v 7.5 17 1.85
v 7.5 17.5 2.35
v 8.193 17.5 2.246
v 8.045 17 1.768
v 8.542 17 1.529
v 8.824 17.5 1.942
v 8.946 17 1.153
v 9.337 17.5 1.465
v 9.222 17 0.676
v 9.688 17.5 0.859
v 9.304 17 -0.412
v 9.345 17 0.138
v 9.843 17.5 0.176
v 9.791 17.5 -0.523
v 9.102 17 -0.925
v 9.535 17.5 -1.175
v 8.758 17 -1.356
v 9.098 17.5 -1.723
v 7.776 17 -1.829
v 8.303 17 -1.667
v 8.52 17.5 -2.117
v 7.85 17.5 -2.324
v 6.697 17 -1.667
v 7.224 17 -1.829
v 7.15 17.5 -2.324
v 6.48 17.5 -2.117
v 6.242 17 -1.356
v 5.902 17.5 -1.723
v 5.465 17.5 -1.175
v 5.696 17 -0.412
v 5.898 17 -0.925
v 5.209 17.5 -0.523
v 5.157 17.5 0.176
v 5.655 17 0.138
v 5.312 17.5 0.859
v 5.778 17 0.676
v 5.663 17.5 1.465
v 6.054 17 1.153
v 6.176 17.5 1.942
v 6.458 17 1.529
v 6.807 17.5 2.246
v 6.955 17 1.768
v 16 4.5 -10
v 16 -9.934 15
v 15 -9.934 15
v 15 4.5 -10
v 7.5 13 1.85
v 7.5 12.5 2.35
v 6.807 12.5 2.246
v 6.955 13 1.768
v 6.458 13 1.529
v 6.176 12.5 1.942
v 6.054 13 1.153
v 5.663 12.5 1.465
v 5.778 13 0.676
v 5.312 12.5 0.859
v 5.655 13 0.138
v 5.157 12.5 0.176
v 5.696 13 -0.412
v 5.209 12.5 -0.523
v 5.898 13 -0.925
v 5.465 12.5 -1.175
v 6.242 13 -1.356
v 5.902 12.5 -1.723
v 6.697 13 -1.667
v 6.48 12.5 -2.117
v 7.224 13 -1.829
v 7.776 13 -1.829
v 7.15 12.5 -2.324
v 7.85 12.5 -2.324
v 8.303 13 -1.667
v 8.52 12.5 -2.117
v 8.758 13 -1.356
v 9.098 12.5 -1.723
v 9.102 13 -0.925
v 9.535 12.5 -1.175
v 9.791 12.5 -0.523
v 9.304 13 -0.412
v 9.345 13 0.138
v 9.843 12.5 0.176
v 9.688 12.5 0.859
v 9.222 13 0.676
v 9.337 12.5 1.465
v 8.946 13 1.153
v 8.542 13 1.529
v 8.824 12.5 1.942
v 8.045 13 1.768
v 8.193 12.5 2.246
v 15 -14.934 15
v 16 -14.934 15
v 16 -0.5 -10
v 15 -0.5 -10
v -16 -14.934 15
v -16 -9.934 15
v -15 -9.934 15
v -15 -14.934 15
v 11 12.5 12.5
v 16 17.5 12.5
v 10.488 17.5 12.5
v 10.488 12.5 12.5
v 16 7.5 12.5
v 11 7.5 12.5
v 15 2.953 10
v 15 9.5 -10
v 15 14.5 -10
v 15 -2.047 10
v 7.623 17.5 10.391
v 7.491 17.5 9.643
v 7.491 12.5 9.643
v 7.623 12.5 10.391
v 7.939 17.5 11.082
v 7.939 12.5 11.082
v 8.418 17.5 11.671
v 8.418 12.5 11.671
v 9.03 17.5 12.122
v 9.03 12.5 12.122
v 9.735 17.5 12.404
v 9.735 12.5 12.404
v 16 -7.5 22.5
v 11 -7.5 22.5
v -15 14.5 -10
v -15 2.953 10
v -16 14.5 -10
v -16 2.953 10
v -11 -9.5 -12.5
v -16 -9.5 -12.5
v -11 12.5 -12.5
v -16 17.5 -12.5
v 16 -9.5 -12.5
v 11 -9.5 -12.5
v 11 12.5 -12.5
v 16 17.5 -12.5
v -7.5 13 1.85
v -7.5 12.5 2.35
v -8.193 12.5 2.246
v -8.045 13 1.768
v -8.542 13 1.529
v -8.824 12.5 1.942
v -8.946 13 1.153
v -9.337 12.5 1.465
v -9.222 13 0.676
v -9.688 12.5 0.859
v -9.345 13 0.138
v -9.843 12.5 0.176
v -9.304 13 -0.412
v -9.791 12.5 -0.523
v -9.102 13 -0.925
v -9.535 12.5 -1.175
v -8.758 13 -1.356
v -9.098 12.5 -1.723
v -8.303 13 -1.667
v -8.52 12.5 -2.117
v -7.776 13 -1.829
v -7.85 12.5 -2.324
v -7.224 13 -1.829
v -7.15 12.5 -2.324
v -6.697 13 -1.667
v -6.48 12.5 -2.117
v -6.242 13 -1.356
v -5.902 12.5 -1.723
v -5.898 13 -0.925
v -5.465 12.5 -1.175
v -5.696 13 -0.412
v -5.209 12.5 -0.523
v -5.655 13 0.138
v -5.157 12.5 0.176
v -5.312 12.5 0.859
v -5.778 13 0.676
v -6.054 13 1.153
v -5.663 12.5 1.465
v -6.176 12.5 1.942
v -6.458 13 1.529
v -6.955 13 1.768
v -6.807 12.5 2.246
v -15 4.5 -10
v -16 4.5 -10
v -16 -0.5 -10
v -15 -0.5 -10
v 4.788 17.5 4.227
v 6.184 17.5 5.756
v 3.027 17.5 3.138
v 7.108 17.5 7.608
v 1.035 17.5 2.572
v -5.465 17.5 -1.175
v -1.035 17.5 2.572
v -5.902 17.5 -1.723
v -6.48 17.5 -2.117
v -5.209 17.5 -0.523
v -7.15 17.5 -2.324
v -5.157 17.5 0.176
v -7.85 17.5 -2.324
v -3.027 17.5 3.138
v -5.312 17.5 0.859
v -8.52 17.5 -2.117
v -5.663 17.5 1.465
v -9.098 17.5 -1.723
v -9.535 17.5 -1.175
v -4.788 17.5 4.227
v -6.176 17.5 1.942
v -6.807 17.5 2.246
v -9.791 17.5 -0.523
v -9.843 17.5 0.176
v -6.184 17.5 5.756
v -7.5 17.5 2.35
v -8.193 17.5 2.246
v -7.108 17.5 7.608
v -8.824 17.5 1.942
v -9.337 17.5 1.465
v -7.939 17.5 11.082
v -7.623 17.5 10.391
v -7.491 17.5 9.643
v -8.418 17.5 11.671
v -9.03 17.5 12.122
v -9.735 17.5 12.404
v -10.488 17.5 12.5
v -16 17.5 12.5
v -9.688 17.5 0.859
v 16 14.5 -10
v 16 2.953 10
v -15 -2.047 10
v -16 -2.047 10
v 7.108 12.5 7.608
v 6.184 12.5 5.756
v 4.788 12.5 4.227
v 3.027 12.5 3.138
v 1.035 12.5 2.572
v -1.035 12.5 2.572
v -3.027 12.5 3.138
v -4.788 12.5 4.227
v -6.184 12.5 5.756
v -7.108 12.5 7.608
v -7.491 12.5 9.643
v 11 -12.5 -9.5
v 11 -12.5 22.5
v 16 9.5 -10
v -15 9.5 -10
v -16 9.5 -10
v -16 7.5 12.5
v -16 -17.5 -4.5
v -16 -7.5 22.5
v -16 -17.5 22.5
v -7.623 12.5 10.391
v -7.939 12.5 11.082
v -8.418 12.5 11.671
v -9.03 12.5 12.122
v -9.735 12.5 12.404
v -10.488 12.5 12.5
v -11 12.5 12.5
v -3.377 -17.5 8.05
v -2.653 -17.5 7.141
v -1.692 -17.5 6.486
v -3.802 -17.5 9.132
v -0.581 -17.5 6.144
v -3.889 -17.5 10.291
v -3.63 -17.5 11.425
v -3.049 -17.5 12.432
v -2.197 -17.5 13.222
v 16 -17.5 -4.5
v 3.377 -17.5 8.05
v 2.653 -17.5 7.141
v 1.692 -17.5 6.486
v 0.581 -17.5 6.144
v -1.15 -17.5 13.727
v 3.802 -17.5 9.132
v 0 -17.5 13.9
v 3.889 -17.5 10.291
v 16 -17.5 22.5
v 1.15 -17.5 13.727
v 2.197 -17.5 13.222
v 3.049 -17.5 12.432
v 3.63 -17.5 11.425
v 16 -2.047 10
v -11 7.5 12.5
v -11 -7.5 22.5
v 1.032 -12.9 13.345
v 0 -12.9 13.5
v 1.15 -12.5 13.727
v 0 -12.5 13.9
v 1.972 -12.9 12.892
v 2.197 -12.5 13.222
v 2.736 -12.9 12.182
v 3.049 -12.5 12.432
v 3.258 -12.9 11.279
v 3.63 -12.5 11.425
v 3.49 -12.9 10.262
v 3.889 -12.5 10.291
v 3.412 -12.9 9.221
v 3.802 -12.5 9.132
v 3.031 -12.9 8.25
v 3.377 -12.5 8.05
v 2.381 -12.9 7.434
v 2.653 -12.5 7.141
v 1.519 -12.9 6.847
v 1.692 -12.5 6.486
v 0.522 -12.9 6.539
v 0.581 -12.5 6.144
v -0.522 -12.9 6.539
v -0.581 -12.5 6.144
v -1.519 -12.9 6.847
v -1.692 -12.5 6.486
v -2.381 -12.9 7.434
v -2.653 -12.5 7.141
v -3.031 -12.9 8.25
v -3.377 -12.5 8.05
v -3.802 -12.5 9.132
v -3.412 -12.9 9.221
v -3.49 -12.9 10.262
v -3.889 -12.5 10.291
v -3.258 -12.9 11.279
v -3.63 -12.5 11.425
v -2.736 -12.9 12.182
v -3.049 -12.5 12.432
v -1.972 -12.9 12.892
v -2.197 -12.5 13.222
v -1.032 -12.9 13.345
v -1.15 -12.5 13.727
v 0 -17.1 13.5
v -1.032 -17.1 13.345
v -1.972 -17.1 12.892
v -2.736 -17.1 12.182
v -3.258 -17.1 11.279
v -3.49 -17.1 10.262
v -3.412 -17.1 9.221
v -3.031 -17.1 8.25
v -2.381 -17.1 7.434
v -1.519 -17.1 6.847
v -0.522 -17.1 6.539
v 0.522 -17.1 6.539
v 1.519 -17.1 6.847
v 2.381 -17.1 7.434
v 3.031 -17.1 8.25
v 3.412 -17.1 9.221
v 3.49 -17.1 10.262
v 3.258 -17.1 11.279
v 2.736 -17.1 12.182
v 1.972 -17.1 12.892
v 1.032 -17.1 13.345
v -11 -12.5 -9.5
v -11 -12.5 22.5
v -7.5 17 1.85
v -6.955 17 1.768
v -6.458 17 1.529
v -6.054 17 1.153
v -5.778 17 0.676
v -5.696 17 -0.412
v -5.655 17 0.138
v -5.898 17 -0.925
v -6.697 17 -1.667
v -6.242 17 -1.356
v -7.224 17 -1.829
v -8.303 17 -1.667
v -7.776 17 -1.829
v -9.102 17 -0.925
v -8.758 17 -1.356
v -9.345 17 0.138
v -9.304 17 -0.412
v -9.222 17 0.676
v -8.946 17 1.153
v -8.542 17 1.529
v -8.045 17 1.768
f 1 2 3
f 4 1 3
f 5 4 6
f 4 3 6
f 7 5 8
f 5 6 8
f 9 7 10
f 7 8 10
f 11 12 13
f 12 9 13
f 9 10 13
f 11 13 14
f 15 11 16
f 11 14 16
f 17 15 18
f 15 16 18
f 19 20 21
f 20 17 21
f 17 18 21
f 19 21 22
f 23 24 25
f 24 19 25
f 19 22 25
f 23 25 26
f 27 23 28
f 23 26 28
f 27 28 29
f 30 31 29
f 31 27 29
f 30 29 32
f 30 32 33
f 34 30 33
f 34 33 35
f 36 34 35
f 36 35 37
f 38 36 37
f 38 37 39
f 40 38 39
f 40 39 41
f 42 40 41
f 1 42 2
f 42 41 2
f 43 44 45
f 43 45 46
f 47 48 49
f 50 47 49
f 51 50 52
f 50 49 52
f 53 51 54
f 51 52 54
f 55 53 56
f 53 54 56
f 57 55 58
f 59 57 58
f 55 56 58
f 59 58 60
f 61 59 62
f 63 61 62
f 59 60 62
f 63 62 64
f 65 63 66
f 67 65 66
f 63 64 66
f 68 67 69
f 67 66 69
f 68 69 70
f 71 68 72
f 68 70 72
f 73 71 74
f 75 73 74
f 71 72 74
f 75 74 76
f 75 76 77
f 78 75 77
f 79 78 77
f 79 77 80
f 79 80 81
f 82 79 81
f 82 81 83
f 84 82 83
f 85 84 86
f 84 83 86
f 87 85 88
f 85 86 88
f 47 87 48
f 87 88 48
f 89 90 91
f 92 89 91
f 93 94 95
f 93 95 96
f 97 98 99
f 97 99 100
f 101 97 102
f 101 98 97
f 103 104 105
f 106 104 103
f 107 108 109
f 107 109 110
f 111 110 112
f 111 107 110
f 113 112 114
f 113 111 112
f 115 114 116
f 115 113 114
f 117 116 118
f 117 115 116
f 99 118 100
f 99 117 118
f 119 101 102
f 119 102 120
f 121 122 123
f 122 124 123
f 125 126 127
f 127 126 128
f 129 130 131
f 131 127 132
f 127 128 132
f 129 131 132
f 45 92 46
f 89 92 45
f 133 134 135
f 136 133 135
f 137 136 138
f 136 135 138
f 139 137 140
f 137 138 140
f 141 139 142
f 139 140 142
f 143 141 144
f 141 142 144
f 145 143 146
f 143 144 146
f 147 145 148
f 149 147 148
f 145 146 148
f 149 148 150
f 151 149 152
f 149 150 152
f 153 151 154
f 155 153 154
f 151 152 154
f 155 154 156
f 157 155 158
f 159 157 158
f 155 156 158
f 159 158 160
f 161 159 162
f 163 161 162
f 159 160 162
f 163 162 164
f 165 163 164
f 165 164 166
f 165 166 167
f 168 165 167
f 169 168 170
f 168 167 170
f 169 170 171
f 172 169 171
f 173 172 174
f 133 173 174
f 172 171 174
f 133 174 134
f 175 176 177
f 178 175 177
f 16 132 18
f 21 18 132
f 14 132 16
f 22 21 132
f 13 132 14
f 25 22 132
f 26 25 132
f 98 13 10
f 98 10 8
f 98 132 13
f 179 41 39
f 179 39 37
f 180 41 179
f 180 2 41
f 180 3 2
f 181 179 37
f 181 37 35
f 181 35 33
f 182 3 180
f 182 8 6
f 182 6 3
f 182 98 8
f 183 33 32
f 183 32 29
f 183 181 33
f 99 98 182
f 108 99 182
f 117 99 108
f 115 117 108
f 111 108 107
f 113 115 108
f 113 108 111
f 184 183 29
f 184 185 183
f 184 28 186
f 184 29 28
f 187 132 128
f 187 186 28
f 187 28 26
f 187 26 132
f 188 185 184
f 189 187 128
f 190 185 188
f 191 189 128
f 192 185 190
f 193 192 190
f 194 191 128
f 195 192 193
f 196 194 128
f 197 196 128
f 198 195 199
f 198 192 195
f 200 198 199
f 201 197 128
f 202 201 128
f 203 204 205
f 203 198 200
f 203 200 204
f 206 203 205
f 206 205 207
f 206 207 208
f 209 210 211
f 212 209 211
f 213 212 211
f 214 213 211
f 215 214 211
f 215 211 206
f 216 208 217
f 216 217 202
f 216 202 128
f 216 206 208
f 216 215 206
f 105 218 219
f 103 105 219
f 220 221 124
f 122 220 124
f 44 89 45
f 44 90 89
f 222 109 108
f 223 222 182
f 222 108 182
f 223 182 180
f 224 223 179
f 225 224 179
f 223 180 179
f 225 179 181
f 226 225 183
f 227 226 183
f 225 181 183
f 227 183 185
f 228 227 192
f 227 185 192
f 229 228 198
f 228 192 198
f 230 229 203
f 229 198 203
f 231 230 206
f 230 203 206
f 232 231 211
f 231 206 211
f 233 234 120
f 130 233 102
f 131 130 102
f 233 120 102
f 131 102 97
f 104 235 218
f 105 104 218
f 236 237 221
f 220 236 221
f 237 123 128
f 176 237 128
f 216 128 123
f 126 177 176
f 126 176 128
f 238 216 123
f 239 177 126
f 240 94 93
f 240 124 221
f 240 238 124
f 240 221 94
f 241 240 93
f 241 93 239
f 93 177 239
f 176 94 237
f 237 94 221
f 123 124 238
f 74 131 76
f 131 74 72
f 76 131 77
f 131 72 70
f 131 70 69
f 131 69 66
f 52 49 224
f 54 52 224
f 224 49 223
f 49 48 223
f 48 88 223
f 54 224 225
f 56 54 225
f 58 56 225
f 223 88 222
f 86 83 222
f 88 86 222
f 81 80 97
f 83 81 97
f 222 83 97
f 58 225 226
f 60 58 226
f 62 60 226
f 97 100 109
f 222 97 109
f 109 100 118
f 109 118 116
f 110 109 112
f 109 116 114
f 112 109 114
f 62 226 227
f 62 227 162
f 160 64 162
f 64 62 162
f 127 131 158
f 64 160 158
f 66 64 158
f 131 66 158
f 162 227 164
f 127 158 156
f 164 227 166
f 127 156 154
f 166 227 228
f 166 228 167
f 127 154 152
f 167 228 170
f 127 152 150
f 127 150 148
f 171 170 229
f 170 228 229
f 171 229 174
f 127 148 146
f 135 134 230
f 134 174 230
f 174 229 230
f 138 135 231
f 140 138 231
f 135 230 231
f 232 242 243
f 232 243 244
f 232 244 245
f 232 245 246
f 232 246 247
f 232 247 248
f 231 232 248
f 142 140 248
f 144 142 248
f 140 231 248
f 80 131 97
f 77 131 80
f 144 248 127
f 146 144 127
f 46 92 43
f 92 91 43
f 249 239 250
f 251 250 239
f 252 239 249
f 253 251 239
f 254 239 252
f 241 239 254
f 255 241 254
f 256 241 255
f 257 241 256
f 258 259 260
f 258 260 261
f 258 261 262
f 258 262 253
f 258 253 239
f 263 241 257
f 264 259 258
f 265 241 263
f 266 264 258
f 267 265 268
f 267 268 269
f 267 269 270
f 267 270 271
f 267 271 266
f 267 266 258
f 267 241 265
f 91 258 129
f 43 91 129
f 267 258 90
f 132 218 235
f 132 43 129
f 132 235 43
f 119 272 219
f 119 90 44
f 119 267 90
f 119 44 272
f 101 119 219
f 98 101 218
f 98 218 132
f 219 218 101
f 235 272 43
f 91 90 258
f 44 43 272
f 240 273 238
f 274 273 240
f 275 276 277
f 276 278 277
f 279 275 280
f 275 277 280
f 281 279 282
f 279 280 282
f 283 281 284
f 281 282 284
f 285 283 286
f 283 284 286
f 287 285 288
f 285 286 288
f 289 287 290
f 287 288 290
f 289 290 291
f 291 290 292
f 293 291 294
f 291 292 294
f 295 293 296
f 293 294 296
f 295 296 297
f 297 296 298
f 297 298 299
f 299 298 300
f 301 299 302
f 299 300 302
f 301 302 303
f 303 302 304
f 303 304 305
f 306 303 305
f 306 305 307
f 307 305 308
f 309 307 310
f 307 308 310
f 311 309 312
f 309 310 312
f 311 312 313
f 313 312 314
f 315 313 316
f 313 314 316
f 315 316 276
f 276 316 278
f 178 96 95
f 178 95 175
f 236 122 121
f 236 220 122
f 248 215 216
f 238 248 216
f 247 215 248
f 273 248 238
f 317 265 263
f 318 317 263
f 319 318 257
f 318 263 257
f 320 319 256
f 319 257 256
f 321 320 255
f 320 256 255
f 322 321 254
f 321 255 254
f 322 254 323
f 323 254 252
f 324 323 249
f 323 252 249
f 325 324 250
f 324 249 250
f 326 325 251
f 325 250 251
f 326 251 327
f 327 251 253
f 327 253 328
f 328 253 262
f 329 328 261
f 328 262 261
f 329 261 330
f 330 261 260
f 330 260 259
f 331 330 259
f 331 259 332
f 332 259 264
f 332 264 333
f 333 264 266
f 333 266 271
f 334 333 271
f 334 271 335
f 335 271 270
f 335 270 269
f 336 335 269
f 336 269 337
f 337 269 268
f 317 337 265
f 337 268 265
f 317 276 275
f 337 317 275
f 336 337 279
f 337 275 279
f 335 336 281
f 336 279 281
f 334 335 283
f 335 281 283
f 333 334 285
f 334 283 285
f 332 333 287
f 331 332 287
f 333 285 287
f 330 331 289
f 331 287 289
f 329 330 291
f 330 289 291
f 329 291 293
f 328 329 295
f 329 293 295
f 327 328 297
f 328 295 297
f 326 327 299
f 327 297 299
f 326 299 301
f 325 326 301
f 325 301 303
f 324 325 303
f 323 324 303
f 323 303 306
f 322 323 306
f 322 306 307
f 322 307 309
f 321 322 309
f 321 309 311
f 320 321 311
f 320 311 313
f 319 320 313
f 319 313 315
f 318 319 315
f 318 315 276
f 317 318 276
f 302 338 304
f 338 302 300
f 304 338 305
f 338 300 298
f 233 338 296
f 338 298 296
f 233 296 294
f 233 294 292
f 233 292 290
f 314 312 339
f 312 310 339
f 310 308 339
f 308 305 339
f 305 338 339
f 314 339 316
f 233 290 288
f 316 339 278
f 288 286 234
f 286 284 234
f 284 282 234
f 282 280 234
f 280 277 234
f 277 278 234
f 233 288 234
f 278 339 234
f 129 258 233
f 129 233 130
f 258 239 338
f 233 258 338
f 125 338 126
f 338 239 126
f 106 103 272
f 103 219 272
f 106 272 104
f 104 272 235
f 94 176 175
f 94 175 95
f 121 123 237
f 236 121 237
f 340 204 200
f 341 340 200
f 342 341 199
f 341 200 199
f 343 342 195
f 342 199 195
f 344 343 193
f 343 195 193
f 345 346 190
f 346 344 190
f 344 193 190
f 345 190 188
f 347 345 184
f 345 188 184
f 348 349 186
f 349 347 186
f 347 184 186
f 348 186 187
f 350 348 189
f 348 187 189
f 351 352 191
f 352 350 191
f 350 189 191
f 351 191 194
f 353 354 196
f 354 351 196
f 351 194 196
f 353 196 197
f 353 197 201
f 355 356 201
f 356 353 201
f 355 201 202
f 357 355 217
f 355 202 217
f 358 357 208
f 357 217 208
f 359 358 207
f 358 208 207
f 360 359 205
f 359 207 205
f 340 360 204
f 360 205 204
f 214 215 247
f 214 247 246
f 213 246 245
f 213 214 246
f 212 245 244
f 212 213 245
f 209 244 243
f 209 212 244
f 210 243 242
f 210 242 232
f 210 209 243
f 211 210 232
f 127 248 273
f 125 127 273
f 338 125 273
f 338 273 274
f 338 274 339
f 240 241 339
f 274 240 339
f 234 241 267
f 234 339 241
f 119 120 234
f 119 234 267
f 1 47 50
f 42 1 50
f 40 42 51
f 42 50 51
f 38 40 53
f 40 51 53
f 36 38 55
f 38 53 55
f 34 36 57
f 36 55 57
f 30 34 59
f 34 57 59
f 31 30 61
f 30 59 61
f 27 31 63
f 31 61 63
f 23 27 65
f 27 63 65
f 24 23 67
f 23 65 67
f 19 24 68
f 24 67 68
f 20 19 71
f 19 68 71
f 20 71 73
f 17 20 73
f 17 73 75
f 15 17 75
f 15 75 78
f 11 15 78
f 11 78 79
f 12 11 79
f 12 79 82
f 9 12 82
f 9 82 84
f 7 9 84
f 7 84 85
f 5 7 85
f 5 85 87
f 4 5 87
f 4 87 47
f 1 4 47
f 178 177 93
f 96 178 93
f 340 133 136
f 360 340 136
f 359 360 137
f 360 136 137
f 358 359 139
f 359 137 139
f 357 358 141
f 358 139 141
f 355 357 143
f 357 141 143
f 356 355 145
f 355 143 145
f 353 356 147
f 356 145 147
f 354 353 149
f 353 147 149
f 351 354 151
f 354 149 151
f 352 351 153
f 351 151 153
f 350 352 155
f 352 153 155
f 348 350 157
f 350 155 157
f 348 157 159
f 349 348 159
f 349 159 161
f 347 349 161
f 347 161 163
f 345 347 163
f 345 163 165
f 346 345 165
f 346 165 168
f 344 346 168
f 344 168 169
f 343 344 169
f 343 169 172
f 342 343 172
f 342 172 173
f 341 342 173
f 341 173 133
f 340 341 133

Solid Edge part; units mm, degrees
sketch "Sketch1" plane through (0, 0, 0) normal (0, 0, 1) x (1, 0, 0)
  line L0 (-11, -12.5) -> (11, -12.5)
  line L1 (11, -12.5) -> (11, 12.5)
  line L2 (11, 12.5) -> (-11, 12.5)
  line L3 (-11, 12.5) -> (-11, -12.5)
  line L4 (-16, -17.5) -> (16, -17.5)
  line L5 (16, -17.5) -> (16, 17.5)
  line L6 (16, 17.5) -> (-16, 17.5)
  line L7 (-16, 17.5) -> (-16, -17.5)
  dimension "D1" = 22
  dimension "D2" = 32
  dimension "D3" = 25
  dimension "D4" = 35
extrude "body" add sketch "Sketch1" against normal blind 12.5 and the other way blind 22.5
sketch "Sketch2" plane through (16, 0, 4) normal (1, 0, 0) x (0, 0, -1)
  line L0 (-18.5, 17.5) -> (-8.5, 17.5)
  line L1 (-8.5, 17.5) -> (-8.5, 7.5)
  line L2 (-8.5, 7.5) -> (-18.5, -7.5)
  line L3 (-18.5, -7.5) -> (-18.5, 17.5)
  dimension "D1" = 25
  dimension "D2" = 10
extrude "Cutout1" cut sketch "Sketch2" against normal through all
chamfer "side_chamfer" distance 8 angle 45 1 edges at (0, -17.5, -12.5)
hole "Hole1" at (-7.5, 17.5, 0) direction (0, -1, 0) diameter 3.7 depth 10 tip angle 118 start chamfer 0.5 start chamfer angle 45 end chamfer 0.5 end chamfer angle 45
hole "Hole2" at (7.5, 17.5, 0) direction (0, -1, 0) diameter 3.7 depth 10 tip angle 118 start chamfer 0.5 start chamfer angle 45 end chamfer 0.5 end chamfer angle 45
sketch "Sketch3" plane through (-16, 0, 5) normal (-1, 0, 0) x (0, 0, 1)
  line L0 (-15, 14.5) -> (-15, 9.5)
  line L1 (-15, 9.5) -> (5, -2.047)
  line L2 (5, -2.047) -> (5, 2.953)
  line L3 (5, 2.953) -> (-15, 14.5)
  line L4 (-15, 4.5) -> (-15, -0.5)
  line L5 (-15, -0.5) -> (10, -14.9338)
  line L6 (10, -9.9338) -> (10, -14.9338)
  line L7 (-15, 4.5) -> (10, -9.9338)
  dimension "D1" = 5
  dimension "D2" = 3
  dimension "D3" = 20
  dimension "D4" = 5
  dimension "D5" = 25
extrude "design_cutout" cut sketch "Sketch3" against normal blind 1
hole "leg_screw_cutout" at (0, -12.5, 10) direction (0, -1, 0) diameter 7 end up to next start chamfer 0.4 start chamfer angle 45 end chamfer 0.4 end chamfer angle 45
sketch "Sketch4" plane through (0, 17.5, 0) normal (0, 1, 0) x (0, 0, -1)
  circle A0 centre (-10, 0) radius 7.5
  dimension "D1" = 15
extrude "Cutout2" cut sketch "Sketch4" against normal up to next
fillet "screw_helper_rounding" radius 3 2 edges at (-7.0711, 15, 12.5) (7.0711, 15, 12.5)
mirror "Mirror1" about plane through (0, 0, 0) normal (1, 0, 0) of "design_cutout"
properties material "Polyethylene, low density"
